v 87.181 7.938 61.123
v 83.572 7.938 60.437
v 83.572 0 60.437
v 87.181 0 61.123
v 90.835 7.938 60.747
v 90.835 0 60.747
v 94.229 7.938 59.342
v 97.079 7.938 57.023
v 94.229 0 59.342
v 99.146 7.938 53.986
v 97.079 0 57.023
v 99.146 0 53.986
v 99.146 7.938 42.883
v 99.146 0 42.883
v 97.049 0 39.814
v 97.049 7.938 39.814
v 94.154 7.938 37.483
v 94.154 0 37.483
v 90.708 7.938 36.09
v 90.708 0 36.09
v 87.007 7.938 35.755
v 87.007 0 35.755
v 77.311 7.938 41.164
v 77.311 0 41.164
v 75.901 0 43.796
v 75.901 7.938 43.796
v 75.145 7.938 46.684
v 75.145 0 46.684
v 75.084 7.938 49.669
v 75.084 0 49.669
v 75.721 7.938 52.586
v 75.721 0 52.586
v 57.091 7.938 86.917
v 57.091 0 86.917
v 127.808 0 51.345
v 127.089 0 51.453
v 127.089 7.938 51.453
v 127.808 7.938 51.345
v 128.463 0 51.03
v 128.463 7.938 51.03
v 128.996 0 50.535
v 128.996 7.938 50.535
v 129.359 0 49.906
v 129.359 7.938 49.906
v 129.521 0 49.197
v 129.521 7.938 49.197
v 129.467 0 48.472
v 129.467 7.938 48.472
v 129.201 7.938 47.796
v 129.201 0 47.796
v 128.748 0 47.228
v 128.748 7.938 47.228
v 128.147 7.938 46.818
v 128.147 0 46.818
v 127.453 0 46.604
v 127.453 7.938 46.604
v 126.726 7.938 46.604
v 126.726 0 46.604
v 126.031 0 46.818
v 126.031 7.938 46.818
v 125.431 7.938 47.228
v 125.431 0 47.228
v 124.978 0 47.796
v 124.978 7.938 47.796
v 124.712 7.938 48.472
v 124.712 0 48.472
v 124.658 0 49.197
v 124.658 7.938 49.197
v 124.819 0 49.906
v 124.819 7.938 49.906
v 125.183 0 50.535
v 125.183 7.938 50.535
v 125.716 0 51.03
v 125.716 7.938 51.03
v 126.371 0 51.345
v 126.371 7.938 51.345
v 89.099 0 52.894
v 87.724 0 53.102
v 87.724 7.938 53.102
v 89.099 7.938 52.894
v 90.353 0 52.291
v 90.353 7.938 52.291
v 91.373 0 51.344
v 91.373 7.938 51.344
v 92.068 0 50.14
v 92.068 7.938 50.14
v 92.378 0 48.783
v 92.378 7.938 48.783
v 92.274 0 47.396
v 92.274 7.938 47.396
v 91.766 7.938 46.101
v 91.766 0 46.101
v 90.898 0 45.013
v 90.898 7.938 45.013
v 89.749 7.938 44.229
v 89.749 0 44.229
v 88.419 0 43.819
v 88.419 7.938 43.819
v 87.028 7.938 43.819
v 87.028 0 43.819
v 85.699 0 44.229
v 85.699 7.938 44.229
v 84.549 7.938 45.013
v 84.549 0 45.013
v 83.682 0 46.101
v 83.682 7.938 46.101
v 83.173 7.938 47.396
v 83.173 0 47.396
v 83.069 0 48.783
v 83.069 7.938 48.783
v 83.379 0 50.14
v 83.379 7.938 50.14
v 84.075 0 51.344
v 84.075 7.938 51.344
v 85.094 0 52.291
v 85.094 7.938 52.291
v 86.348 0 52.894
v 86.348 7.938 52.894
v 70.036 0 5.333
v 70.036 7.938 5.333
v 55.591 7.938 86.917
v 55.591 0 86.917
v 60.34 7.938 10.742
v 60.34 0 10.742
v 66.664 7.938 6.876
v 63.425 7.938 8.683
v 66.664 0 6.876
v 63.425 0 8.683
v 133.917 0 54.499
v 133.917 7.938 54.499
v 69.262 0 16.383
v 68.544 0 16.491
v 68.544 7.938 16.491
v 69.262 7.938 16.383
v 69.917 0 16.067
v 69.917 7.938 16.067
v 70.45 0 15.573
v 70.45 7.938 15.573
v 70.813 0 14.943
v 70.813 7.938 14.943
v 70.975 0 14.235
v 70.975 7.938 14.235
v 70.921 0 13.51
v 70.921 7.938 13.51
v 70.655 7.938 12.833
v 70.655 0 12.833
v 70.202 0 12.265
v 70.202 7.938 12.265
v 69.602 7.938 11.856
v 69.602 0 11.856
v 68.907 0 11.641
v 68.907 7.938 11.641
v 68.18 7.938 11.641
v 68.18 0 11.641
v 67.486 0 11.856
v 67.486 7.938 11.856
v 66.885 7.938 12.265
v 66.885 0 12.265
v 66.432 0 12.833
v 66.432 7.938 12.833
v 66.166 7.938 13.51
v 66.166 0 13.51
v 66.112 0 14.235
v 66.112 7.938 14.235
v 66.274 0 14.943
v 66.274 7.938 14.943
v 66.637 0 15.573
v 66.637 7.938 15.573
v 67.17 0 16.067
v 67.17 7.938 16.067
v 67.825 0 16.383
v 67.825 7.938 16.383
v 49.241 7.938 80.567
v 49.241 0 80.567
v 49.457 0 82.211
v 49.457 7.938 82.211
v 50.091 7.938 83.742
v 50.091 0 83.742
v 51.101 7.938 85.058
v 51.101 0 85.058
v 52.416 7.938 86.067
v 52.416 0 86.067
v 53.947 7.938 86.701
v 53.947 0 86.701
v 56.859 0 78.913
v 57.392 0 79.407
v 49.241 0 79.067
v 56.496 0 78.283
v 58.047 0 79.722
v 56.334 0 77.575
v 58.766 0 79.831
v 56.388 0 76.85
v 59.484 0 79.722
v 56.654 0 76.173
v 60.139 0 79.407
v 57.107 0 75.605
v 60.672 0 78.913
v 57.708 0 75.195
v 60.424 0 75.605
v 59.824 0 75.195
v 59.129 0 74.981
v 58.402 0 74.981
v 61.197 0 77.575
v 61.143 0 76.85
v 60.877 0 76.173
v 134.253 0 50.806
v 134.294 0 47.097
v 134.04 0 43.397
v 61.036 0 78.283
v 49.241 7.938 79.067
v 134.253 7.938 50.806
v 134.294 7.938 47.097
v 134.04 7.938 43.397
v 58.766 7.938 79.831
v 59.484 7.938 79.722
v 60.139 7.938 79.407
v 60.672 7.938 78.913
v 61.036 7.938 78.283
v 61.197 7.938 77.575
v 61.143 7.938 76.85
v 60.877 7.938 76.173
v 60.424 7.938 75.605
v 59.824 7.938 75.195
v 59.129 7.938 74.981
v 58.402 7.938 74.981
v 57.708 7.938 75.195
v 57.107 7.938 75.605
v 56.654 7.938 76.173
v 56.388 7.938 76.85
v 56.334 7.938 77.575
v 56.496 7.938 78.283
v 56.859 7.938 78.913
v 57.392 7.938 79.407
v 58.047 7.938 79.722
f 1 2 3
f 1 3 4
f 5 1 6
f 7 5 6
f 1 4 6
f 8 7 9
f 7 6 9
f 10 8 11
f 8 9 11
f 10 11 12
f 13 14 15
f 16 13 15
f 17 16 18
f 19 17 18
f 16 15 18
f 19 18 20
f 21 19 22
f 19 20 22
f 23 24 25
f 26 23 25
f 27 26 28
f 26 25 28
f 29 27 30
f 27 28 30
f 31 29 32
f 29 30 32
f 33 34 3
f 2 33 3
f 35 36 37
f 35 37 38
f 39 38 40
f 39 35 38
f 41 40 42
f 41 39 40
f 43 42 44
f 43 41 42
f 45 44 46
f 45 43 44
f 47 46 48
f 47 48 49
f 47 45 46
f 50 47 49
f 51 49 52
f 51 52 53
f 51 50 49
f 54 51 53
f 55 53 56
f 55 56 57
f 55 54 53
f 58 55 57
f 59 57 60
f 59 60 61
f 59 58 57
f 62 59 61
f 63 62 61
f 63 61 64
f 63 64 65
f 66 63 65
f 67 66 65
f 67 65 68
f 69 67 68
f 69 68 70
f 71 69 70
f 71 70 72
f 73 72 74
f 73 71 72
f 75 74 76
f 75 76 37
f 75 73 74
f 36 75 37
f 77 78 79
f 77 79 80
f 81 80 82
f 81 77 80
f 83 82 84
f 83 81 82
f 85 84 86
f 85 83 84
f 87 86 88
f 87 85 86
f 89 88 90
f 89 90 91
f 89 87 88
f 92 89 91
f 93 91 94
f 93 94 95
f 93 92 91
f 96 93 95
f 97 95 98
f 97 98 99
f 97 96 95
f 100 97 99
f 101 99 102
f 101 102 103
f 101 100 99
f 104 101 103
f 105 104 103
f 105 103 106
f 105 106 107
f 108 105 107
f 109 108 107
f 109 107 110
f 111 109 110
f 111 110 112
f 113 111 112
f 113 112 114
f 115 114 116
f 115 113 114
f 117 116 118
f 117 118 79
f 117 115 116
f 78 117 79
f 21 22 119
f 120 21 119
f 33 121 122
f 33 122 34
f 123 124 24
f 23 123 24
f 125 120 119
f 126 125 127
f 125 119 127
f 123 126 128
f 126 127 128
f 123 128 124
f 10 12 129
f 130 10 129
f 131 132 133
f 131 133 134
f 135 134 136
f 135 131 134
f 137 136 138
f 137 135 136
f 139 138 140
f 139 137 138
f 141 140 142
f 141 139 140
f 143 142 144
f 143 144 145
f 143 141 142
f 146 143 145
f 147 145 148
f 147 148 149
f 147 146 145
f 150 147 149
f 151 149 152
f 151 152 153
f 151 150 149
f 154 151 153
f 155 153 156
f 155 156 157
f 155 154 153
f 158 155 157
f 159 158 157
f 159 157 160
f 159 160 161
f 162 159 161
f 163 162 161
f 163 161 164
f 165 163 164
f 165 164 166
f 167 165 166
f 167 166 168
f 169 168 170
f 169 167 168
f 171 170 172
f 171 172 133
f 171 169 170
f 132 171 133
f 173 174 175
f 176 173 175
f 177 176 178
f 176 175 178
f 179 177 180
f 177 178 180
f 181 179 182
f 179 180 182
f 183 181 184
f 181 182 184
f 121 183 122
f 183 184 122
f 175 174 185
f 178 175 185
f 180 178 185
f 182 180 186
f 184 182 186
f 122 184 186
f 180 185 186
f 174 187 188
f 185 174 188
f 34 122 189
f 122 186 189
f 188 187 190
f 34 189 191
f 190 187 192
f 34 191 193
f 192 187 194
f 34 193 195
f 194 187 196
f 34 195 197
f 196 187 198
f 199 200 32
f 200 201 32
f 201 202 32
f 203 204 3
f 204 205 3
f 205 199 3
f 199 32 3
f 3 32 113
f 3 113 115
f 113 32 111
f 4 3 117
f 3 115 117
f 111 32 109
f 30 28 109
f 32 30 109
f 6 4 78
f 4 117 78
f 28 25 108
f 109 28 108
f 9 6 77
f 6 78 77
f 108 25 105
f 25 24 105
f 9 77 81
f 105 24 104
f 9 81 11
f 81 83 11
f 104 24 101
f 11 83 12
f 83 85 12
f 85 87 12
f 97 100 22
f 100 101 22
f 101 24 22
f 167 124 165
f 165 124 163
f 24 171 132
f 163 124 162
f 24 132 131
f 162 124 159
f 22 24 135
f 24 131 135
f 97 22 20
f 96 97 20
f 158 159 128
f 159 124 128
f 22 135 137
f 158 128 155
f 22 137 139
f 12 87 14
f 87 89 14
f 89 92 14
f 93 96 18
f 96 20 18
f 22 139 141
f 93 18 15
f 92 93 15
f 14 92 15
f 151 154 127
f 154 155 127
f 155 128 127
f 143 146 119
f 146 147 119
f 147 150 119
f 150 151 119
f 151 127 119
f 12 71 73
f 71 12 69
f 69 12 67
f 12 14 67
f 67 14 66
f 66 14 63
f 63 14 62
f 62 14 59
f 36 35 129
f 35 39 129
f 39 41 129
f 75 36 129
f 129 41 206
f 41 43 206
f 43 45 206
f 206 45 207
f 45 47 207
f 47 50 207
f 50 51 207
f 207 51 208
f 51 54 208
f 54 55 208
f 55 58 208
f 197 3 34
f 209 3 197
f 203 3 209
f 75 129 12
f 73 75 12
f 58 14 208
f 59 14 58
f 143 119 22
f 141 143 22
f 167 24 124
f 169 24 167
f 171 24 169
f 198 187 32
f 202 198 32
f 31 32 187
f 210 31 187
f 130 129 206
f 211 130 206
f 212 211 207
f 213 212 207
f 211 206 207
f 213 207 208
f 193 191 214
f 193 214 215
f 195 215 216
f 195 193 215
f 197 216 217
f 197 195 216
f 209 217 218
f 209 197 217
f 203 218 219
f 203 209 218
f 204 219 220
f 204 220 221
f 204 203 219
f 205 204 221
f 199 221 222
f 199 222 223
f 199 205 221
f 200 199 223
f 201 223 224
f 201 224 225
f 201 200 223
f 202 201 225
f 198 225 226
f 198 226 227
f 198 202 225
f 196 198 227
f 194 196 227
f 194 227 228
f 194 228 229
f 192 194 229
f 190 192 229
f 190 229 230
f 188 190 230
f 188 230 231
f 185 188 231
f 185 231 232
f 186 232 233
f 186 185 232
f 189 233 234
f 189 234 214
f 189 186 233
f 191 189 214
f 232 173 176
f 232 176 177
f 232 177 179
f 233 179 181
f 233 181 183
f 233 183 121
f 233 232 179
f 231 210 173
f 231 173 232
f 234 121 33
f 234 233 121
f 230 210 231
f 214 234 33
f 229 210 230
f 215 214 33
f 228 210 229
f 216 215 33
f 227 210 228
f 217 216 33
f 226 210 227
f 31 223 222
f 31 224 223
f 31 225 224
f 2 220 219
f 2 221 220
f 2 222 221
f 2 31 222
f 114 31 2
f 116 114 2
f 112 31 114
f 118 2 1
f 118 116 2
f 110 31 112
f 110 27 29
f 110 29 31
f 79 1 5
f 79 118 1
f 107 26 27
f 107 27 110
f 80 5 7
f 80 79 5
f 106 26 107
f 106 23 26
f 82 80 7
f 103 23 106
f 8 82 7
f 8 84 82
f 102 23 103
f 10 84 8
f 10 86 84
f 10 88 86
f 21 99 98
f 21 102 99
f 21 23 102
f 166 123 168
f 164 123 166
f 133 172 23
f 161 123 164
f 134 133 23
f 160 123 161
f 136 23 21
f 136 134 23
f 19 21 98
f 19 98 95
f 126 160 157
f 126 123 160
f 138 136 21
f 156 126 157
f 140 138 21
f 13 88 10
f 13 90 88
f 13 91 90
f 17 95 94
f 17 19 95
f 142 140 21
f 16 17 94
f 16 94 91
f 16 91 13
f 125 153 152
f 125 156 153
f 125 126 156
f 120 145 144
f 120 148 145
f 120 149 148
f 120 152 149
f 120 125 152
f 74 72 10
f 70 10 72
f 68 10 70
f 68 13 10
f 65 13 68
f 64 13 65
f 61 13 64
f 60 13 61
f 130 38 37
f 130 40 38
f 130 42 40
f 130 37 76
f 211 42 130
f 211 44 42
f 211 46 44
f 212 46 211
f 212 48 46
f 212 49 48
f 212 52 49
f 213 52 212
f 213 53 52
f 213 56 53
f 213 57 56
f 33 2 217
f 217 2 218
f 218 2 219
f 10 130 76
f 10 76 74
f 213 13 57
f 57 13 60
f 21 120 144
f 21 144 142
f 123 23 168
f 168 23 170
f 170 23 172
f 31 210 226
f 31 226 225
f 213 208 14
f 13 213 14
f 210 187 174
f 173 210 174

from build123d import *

# Parameters (mm, degrees)
SKETCH2_R           = 2.4384
SKETCH2_R_2         = 4.66725
BOSS_EXTRUDE1_DEPTH = 7.9375


with BuildPart() as part:
    # Sketch2 → Boss-Extrude1 (new body)
    with BuildSketch(Plane(origin=(0, 0, 0), x_dir=(1, 0, 0), z_dir=(0, 1, 0))):
        with BuildLine():
            Line((55.590698865, -86.917376556), (57.091379829, -86.917376556))
            Line((57.091379829, -86.917376556), (83.572039589, -60.436716796))
            ThreePointArc((83.572039589, -60.436716796), (92.583392677, -60.167850758), (99.145825273, -53.986325716))
            Line((99.145825273, -53.986325716), (133.917161076, -54.4991448))
            ThreePointArc((133.917161076, -54.4991448), (134.310699941, -48.951866676), (134.040463462, -43.397216403))
            Line((134.040463462, -43.397216403), (99.145825273, -42.882578814))
            ThreePointArc((99.145825273, -42.882578814), (94.154259421, -37.482880814), (87.006822934, -35.754696848))
            Line((87.006822934, -35.754696848), (70.035827706, -5.332650295))
            ThreePointArc((70.035827706, -5.332650295), (65.026183263, -7.747234822), (60.339928944, -10.741525445))
            Line((60.339928944, -10.741525445), (77.310924172, -41.163571998))
            ThreePointArc((77.310924172, -41.163571998), (75.144838741, -46.683971579), (75.721358625, -52.586035832))
            Line((75.721358625, -52.586035832), (49.240698865, -79.066695593))
            Line((49.240698865, -79.066695593), (49.240698865, -80.567376556))
            ThreePointArc((49.240698865, -80.567376556), (51.100570805, -85.057504617), (55.590698865, -86.917376556))
        make_face()
        with Locations(Location((58.765698865, -77.392376556, 0), (0, 0, 270))):
            Circle(SKETCH2_R, mode=Mode.SUBTRACT)
        with Locations(Location((87.723623157, -48.434452265, 0), (0, 0, 270))):
            Circle(SKETCH2_R_2, mode=Mode.SUBTRACT)
        with Locations(Location((127.089342108, -49.015030821, 0), (0, 0, 270))):
            Circle(SKETCH2_R, mode=Mode.SUBTRACT)
        with Locations(Location((68.54355946, -14.052450337, 0), (0, 0, 270))):
            Circle(SKETCH2_R, mode=Mode.SUBTRACT)
    extrude(amount=BOSS_EXTRUDE1_DEPTH)


solid = part.part
